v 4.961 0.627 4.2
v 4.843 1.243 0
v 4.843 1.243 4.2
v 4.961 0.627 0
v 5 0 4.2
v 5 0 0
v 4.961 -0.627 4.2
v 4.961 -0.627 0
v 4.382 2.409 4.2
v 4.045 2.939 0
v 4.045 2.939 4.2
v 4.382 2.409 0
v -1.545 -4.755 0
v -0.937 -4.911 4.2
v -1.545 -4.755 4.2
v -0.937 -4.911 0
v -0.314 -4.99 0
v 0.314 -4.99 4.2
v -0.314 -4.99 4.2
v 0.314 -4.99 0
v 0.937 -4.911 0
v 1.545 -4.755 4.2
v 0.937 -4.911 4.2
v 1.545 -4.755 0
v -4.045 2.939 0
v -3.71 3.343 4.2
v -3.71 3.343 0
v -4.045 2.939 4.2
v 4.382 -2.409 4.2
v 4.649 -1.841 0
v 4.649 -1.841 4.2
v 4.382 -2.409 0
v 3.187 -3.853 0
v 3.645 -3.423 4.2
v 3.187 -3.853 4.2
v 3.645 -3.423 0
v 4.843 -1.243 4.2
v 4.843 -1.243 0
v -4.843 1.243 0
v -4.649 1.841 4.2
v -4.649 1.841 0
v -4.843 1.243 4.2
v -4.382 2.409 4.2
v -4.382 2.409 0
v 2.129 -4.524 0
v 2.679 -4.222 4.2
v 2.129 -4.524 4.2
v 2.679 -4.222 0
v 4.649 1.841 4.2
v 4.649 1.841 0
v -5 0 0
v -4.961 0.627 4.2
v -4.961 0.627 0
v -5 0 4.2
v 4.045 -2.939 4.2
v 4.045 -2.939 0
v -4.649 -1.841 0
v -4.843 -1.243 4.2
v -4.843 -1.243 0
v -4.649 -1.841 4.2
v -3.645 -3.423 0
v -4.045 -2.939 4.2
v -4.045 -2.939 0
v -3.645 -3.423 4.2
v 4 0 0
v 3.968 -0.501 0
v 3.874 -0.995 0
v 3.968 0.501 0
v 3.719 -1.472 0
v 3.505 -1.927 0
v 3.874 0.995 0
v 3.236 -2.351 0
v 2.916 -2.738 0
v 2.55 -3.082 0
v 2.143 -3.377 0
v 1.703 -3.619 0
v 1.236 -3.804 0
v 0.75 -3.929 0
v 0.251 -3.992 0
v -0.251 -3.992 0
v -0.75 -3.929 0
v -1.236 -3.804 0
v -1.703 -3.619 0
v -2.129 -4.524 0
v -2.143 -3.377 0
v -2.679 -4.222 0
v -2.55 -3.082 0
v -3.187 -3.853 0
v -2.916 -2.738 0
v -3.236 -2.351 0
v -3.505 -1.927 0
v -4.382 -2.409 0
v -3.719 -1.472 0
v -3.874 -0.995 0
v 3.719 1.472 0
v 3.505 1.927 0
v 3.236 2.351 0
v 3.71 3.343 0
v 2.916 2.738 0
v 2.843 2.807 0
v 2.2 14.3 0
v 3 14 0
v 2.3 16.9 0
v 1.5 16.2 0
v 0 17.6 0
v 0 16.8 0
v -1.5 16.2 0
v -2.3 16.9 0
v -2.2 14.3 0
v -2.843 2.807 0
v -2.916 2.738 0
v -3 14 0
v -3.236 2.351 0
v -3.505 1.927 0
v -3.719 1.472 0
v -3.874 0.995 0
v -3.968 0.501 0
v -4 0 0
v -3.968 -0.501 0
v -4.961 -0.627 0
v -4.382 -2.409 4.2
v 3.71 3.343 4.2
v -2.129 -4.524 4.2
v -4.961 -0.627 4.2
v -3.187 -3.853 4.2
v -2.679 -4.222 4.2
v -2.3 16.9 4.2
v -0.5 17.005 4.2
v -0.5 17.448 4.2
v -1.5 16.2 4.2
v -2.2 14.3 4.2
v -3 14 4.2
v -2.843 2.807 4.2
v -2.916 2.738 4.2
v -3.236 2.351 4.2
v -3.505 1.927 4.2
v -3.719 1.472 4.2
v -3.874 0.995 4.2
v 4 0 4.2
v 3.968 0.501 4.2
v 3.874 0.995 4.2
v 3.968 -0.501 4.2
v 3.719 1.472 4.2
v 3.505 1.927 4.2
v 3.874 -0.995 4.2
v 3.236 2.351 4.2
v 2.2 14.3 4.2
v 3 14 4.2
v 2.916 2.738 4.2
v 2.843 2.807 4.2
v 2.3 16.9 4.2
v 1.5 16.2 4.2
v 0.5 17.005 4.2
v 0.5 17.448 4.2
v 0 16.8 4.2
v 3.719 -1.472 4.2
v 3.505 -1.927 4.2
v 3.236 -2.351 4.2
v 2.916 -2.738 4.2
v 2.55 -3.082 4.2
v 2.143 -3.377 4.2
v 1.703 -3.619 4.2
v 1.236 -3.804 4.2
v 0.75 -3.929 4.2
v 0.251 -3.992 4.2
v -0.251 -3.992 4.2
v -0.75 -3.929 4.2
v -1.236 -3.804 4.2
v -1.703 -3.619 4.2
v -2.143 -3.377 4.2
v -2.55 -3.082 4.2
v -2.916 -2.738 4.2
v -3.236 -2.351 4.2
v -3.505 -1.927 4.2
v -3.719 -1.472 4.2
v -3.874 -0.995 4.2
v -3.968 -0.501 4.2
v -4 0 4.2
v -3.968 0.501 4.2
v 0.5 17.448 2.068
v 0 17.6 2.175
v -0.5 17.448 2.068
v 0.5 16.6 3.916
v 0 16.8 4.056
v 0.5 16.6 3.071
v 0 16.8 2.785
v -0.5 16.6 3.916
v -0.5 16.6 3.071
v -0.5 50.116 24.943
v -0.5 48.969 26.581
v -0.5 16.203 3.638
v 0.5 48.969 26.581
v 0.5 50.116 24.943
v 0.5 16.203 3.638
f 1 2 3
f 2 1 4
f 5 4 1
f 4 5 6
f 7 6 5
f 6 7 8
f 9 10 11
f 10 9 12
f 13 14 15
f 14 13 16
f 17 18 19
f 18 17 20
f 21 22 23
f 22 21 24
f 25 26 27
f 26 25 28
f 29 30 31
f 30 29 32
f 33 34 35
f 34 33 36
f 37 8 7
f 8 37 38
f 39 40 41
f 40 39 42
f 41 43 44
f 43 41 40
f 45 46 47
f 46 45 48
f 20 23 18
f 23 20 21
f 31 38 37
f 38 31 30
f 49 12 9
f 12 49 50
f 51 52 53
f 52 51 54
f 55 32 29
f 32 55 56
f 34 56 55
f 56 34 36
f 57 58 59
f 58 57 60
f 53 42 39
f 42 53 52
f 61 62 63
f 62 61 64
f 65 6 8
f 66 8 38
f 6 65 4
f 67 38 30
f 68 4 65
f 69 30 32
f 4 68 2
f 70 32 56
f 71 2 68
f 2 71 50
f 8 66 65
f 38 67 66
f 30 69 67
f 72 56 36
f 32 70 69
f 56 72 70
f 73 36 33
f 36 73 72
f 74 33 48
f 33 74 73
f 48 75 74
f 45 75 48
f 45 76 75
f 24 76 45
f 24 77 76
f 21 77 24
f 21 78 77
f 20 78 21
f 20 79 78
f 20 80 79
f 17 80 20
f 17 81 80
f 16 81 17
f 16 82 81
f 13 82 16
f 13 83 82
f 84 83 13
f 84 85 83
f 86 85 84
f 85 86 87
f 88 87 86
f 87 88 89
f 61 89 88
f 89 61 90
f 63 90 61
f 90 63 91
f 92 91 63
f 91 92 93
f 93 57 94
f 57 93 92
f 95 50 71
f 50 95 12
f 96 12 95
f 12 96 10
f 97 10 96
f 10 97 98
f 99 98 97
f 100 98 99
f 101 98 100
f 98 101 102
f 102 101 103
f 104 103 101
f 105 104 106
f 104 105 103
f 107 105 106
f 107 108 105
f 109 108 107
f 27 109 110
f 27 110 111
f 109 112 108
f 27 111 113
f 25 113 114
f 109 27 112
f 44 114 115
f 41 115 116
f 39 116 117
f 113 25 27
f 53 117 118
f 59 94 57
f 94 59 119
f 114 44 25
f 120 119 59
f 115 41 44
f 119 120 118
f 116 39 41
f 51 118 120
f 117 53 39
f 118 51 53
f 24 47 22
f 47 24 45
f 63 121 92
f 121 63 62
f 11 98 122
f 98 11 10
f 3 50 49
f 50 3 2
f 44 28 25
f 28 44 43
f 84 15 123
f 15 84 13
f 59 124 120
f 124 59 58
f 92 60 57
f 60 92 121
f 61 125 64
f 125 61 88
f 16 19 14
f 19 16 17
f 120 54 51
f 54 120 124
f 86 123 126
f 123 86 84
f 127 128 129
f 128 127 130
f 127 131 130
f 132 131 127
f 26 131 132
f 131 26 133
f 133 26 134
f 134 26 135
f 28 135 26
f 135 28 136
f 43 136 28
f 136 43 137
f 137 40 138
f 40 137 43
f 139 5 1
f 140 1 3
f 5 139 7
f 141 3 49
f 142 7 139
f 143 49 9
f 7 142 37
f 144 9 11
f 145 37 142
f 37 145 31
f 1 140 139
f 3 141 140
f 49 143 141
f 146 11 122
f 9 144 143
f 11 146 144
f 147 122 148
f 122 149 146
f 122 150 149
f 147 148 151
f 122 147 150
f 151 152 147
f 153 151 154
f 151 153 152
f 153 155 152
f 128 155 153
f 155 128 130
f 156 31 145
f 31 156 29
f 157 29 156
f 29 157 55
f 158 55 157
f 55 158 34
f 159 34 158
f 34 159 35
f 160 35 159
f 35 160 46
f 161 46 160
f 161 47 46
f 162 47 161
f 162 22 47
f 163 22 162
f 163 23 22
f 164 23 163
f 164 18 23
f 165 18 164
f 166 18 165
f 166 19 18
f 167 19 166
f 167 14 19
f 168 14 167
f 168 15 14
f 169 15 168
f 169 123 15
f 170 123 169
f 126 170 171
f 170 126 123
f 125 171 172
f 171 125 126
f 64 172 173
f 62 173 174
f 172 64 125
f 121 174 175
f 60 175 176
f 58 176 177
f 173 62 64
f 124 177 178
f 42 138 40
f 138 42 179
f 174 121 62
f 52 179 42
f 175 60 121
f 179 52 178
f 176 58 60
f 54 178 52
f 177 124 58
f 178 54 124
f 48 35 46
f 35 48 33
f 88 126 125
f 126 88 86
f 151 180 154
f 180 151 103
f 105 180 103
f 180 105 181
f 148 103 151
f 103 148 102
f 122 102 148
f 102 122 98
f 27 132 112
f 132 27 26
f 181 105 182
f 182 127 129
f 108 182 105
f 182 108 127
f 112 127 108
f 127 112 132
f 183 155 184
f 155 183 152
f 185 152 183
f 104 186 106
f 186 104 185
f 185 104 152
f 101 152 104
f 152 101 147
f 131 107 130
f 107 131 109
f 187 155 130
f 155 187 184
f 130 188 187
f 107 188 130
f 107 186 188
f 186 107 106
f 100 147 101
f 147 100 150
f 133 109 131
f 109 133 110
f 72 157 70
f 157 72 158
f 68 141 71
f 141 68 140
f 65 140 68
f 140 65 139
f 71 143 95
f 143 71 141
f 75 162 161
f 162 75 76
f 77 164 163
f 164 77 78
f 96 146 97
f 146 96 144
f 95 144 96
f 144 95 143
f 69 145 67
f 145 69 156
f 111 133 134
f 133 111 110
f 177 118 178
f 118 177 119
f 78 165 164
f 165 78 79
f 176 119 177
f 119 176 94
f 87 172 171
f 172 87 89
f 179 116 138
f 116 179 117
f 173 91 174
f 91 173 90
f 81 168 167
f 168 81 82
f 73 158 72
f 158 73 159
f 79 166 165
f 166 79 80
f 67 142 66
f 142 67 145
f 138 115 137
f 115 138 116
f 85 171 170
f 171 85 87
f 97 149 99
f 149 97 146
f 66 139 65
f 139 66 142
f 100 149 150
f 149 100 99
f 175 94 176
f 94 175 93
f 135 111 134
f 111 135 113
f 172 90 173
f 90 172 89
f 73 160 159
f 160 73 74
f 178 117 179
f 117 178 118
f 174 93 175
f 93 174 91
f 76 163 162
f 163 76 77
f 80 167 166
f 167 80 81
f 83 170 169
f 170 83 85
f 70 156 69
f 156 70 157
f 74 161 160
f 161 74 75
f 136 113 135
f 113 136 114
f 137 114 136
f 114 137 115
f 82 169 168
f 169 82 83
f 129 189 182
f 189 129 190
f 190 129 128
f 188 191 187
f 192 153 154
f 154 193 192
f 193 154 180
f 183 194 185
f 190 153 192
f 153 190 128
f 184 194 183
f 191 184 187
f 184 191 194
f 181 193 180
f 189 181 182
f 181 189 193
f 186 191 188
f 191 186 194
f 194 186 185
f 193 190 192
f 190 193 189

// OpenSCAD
// file: servo_connector.scad
$fn=50;

difference(){

    union(){
        cylinder(d=10, 4.2);
        linear_extrude(4.2){
            polygon([[-4,-1],[-3,14],[-2.3,16.9],[0,17.6],[2.3,16.9],[3,14],[4,-1]]);
        }
    }

    translate([0,0,-.1]){
        linear_extrude(5){
        polygon([[-3,0],[-2.2,14.3],[-1.5,16.2],[0,16.8],[1.5,16.2],[2.2,14.3],[3,0]]);
        }
    }
    
    cylinder(d=8, 10, center=true);
}
// main file
include<servo_connector.scad>


translate([-.5,17.35,2])
rotate([35,0,0])
cube([1,40,2]);
